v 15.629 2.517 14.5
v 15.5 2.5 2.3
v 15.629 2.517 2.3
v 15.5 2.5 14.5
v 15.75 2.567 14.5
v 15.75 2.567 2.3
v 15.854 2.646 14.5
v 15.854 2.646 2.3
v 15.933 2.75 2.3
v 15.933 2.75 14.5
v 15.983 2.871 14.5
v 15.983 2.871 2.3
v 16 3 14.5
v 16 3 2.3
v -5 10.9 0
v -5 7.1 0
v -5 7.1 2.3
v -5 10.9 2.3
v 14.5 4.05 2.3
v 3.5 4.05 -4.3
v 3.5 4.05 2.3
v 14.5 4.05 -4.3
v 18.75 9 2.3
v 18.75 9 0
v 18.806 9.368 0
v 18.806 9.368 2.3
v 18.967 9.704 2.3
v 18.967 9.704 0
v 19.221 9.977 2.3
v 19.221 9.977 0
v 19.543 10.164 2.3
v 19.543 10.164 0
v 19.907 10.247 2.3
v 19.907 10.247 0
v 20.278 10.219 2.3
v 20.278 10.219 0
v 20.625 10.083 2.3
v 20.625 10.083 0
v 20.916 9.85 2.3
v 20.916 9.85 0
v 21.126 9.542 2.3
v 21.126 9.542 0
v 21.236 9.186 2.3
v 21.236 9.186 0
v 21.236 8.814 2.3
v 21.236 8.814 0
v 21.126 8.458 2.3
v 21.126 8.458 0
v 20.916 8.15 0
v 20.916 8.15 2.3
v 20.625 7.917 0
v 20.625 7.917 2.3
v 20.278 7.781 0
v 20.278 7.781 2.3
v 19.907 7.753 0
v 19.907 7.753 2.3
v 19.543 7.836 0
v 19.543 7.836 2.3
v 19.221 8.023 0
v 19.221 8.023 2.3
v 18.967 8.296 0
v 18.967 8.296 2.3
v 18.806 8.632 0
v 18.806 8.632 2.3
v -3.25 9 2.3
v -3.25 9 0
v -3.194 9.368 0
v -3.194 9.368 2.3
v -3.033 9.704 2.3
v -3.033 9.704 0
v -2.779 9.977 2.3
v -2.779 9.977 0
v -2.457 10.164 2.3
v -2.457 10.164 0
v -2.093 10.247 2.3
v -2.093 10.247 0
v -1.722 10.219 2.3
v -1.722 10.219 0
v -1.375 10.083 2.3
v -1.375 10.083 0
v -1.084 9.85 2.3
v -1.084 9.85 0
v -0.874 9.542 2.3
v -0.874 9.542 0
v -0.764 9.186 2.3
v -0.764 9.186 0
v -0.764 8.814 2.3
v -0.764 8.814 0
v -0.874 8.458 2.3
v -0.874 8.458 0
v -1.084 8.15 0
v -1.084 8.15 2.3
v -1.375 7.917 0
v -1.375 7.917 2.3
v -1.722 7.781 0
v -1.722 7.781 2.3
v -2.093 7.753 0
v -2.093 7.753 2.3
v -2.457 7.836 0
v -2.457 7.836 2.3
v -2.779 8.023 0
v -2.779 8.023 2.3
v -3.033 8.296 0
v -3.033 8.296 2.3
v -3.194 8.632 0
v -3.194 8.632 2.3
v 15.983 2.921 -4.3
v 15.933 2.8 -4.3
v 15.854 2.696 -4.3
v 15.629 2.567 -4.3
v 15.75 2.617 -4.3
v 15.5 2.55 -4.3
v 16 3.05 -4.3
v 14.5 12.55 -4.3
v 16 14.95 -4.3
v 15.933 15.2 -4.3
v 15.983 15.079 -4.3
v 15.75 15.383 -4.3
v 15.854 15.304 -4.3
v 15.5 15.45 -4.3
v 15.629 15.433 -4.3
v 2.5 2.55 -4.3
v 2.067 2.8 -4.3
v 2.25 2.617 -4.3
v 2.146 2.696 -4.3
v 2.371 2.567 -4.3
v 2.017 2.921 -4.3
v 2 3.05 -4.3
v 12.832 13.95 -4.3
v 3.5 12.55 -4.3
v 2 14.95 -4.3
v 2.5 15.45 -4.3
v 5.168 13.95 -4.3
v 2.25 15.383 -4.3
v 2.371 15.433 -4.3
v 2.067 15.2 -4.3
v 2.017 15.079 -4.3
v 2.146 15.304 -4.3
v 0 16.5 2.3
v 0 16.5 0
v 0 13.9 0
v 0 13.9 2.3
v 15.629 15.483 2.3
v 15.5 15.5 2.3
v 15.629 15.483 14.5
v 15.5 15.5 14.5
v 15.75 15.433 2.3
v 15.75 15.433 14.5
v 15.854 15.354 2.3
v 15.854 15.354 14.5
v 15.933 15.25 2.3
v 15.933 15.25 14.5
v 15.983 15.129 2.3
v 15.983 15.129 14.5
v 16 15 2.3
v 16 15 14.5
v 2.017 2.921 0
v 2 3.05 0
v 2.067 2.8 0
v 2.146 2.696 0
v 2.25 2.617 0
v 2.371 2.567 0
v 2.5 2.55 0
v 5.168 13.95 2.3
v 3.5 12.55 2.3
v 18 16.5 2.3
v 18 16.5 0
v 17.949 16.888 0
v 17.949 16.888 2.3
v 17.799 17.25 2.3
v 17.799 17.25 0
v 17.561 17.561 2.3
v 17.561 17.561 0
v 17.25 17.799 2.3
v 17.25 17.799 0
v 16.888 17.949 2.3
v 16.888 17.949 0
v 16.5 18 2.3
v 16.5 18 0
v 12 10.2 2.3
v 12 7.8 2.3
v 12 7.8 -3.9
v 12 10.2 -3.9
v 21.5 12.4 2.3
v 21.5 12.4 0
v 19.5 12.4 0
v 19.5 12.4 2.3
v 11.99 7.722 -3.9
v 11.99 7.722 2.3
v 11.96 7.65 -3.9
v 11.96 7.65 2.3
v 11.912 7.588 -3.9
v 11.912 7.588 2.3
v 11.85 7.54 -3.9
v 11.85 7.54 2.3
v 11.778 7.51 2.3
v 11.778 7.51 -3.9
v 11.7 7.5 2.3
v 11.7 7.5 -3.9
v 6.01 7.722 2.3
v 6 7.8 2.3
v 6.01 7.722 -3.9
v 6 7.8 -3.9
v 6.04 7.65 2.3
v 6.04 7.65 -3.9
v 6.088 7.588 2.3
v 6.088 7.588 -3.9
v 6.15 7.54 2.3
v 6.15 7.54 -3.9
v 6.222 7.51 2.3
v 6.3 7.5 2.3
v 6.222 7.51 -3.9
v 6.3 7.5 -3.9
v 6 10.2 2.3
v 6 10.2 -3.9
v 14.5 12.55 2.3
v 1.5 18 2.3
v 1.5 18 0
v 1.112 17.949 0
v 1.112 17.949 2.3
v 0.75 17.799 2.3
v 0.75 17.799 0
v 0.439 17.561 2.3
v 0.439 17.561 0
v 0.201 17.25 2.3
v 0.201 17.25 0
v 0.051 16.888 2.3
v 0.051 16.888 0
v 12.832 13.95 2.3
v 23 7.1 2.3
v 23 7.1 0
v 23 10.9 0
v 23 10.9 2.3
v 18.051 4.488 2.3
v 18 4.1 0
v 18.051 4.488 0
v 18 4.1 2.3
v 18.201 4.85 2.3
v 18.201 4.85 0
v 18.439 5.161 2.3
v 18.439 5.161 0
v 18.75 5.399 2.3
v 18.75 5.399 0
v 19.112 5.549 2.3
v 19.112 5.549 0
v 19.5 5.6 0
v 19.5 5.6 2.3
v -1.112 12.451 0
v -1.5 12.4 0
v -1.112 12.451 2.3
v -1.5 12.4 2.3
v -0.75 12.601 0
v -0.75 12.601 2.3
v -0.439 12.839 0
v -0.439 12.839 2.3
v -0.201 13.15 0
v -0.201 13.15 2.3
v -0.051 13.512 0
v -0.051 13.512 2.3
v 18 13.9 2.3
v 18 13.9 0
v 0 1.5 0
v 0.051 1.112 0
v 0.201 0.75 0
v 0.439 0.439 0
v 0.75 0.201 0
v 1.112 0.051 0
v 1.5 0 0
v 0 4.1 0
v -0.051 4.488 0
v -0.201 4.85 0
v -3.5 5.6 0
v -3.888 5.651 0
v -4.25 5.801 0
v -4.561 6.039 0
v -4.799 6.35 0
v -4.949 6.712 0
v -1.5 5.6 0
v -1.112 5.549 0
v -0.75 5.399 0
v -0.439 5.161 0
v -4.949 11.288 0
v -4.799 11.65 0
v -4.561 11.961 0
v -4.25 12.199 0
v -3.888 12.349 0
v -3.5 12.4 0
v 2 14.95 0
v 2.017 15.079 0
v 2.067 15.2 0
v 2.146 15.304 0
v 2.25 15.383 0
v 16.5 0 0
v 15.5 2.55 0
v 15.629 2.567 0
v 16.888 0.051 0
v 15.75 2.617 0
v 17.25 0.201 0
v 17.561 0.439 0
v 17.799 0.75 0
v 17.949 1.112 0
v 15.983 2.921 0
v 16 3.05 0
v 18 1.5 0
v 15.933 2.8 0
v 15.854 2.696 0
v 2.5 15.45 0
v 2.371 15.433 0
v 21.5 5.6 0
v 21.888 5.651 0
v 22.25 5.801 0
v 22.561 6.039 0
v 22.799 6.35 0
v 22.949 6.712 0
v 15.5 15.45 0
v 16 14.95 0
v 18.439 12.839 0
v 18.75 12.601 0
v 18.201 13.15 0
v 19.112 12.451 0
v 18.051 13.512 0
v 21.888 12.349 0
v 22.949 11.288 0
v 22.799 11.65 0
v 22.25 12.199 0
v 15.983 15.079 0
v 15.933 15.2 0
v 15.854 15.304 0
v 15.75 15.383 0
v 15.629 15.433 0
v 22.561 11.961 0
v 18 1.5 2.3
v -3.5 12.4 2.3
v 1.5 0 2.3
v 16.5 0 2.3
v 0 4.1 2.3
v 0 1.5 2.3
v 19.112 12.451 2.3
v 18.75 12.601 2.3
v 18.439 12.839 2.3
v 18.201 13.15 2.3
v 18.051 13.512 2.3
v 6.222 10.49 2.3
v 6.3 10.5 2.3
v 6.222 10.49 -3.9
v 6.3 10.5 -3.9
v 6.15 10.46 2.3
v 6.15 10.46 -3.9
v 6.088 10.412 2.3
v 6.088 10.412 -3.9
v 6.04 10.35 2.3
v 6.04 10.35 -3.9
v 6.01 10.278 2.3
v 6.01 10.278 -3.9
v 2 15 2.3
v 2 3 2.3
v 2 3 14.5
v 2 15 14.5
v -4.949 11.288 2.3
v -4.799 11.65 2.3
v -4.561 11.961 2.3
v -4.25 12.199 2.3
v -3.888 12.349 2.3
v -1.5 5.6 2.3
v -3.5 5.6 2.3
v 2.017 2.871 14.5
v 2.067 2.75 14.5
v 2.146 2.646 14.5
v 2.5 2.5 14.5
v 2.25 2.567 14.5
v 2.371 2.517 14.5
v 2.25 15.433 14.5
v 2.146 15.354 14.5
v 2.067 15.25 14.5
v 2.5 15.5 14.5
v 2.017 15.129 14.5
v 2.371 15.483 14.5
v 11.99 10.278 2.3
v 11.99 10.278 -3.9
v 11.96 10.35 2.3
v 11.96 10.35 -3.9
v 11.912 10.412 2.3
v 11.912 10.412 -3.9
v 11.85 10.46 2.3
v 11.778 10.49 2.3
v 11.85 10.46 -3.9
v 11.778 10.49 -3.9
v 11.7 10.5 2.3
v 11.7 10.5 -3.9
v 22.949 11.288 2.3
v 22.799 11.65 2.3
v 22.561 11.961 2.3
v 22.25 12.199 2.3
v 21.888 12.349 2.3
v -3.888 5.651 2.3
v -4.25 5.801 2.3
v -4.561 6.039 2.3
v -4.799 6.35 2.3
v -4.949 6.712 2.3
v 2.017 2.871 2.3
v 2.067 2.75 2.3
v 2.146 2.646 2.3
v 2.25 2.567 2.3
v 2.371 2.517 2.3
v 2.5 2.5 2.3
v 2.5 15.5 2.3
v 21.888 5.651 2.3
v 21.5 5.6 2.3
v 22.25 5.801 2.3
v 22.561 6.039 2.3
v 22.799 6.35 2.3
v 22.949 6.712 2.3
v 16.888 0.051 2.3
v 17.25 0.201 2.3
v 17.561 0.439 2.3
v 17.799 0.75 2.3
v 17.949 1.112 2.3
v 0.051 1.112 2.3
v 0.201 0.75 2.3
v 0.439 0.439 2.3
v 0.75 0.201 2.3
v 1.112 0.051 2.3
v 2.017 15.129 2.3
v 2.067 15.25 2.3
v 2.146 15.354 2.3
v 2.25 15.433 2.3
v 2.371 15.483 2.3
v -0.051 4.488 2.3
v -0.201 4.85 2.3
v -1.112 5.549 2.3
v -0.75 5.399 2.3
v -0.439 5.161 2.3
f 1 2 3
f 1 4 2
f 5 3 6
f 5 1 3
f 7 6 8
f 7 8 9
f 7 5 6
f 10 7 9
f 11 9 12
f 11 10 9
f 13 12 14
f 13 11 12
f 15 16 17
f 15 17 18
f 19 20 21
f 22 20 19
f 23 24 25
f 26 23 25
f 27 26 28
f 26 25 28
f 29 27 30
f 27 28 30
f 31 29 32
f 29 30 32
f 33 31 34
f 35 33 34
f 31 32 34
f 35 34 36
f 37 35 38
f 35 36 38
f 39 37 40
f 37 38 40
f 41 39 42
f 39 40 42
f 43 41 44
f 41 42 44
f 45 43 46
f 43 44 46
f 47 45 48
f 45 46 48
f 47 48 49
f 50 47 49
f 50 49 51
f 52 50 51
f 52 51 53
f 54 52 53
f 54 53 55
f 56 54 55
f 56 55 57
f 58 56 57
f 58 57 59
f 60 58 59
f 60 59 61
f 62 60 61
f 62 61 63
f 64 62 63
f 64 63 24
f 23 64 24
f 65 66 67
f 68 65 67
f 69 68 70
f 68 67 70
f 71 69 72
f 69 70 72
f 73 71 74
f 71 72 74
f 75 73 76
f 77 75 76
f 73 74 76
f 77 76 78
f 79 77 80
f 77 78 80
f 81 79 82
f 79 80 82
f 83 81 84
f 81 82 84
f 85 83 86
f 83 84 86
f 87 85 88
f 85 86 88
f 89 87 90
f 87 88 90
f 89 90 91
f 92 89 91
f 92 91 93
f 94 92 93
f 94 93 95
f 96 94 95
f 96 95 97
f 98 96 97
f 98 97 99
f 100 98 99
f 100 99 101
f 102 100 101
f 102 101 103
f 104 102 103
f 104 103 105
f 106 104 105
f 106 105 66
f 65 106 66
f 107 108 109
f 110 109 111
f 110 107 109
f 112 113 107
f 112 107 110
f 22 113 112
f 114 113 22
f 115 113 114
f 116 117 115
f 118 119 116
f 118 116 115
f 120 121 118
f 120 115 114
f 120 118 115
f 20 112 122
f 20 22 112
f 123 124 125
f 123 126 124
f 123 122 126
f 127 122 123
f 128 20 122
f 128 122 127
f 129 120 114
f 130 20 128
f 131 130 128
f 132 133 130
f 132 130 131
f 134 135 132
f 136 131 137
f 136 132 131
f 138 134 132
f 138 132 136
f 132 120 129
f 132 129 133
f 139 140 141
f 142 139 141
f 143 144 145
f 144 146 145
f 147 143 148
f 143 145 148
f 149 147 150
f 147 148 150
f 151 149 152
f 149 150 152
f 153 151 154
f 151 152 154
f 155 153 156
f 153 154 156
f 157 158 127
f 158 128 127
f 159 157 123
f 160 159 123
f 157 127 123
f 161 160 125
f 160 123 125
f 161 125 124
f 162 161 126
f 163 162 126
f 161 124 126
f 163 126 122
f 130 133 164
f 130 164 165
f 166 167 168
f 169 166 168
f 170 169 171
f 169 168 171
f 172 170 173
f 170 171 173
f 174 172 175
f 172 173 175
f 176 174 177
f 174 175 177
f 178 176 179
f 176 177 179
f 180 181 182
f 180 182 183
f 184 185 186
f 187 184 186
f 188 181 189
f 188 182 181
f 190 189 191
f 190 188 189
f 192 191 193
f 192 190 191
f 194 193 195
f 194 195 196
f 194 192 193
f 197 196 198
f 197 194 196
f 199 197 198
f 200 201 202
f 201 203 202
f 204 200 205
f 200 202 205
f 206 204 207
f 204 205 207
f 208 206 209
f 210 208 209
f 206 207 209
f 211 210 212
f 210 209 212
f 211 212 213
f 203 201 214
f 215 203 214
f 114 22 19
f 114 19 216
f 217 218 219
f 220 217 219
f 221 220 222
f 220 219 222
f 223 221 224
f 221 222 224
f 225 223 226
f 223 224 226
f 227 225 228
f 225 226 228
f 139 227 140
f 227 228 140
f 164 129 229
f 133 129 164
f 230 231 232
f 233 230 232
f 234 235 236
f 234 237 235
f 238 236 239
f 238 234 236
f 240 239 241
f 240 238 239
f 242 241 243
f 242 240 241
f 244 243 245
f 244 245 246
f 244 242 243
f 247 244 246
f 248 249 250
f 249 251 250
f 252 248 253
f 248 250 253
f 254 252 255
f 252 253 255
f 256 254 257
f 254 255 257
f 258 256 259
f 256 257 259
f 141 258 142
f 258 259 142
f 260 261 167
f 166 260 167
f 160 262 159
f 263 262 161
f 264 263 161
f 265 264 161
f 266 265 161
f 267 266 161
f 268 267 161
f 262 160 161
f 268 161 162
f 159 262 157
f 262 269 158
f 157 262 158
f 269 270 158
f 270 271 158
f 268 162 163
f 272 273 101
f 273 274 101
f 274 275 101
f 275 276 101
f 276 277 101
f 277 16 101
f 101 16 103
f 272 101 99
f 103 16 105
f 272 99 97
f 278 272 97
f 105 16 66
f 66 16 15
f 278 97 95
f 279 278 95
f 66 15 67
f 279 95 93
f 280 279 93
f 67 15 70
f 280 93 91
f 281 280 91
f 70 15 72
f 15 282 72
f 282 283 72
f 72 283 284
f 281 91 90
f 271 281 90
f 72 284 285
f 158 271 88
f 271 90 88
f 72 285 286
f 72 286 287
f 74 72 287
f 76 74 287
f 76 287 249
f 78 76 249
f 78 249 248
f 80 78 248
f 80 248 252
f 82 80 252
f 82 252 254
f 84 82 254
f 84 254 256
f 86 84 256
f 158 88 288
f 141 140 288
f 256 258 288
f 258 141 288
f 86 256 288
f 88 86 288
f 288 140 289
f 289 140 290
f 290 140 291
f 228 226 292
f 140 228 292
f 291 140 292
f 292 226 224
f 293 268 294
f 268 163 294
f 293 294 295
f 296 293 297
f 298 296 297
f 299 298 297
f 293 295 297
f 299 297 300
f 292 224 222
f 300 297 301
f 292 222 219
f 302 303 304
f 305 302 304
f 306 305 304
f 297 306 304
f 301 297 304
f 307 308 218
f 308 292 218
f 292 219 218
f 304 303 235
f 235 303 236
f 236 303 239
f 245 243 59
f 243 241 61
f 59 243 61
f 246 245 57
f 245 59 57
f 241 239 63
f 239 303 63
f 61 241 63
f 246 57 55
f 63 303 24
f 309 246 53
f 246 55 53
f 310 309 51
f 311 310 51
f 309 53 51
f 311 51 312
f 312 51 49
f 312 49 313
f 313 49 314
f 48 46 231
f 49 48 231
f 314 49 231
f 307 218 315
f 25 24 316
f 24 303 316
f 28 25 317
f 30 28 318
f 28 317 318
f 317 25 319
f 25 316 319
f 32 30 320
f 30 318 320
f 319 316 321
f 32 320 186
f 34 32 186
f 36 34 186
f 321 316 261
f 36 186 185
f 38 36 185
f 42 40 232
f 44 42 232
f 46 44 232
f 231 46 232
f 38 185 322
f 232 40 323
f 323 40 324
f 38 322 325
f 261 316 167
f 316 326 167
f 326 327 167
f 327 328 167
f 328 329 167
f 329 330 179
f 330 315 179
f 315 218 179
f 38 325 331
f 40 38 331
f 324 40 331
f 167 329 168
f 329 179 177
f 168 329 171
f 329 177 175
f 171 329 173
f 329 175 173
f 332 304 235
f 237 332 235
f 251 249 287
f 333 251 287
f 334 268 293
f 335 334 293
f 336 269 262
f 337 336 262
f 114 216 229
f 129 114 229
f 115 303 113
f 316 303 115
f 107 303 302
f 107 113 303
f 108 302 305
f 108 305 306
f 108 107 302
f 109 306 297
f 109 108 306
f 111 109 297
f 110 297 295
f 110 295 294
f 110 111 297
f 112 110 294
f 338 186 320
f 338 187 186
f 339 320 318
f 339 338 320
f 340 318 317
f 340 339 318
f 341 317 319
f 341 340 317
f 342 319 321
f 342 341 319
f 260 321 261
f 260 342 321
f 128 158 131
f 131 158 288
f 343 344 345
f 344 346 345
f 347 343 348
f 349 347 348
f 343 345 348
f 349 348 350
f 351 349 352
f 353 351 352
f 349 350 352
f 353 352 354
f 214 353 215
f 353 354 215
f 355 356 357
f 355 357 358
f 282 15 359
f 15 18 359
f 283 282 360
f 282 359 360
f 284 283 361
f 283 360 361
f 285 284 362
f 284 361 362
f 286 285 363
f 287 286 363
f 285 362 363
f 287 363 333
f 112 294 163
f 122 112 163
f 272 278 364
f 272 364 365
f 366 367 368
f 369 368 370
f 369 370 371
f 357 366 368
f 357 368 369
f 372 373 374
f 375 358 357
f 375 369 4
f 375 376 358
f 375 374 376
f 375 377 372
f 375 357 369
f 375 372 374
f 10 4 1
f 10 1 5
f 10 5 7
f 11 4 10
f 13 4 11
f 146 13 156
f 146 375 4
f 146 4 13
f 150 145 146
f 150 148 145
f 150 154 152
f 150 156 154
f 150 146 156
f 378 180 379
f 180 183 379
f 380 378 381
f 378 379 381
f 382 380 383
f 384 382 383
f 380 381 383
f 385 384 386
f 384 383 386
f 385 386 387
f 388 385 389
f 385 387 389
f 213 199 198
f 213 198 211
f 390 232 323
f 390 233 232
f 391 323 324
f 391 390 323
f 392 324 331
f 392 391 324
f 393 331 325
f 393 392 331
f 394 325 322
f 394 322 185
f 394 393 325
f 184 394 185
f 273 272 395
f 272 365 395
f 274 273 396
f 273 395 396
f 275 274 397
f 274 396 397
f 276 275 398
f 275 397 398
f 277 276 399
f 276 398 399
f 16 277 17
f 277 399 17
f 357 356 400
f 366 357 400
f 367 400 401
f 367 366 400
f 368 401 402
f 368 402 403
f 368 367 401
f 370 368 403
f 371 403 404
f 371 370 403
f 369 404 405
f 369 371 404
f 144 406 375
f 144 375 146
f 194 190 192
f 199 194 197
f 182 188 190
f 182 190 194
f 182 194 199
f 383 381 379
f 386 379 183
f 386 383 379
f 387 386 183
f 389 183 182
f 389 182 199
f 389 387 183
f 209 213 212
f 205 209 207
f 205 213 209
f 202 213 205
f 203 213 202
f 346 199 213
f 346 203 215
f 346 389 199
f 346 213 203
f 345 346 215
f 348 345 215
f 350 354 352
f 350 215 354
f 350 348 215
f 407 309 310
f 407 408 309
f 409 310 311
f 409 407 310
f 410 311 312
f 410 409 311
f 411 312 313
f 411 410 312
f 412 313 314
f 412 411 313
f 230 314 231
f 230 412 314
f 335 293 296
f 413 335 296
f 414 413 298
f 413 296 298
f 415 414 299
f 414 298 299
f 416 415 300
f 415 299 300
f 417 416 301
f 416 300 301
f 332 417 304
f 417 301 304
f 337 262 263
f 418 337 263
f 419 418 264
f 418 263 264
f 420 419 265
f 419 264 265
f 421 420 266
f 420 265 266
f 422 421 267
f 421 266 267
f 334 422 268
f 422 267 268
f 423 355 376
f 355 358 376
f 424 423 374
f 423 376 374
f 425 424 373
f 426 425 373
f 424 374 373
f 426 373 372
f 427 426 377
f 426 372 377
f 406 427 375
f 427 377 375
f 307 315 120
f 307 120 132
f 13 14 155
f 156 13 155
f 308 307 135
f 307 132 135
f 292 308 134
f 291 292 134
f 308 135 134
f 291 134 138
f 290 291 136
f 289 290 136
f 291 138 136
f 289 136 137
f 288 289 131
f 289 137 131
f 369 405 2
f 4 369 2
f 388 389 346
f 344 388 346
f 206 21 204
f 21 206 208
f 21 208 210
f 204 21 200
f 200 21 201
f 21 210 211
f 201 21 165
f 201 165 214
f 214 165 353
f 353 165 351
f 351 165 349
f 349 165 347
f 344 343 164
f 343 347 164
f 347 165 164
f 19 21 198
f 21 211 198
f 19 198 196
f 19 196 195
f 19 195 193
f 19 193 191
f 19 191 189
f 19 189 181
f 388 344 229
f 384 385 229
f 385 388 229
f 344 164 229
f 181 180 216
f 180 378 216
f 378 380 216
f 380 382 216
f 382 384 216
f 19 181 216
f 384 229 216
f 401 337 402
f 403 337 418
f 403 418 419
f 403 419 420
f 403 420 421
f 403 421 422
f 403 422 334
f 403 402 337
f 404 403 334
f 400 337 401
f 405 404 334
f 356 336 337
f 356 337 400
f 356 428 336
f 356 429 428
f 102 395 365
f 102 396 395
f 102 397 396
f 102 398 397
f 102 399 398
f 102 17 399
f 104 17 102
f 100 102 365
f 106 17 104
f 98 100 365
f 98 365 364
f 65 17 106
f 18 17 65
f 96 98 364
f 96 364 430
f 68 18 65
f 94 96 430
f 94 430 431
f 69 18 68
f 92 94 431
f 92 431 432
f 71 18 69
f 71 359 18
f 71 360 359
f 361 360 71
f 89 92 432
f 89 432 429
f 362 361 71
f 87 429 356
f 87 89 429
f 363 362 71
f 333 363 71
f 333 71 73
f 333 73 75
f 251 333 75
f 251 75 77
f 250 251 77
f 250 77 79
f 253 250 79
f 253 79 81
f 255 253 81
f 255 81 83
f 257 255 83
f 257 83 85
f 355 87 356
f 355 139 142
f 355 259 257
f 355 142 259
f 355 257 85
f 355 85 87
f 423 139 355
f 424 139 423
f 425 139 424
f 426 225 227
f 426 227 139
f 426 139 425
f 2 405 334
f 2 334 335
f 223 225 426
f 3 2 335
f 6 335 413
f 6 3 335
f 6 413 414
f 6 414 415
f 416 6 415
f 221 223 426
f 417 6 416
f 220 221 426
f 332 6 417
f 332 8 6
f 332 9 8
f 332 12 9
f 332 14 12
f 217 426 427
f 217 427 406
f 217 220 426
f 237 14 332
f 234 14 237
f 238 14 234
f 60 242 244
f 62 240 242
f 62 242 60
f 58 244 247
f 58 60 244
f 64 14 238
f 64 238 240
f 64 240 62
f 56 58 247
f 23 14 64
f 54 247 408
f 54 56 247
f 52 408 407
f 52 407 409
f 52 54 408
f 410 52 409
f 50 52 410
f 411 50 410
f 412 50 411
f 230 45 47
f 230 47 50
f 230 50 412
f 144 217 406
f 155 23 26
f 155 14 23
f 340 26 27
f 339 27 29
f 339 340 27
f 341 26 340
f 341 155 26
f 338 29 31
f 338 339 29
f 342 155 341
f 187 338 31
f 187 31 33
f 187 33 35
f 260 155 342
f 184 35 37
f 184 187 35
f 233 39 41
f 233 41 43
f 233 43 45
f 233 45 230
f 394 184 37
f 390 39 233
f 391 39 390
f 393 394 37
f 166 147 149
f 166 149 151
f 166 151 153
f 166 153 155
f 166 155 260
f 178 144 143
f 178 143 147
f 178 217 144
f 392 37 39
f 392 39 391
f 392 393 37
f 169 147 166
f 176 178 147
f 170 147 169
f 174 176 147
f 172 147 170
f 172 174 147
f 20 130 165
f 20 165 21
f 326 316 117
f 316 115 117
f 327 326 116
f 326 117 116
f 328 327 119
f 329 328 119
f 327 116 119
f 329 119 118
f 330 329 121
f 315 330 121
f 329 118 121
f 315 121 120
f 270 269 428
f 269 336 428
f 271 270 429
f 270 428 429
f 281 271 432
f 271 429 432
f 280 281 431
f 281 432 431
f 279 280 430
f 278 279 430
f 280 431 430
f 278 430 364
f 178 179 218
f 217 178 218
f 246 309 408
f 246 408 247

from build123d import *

# Parameters (mm, degrees)
EXTRUDE_1_DEPTH     = 2.3
SKETCH_2_W          = 14
SKETCH_2_H          = 12.9
EXTRUDE_2_DEPTH     = 4.3
CUT_EXTRUDE_1_DEPTH = 27.297528401
SKETCH_4_W          = 14
SKETCH_4_H          = 13
EXTRUDE_3_DEPTH     = 12.2
FILLET_1_R          = 0.5
SKETCH_5_W          = 6
SKETCH_5_H          = 3
EXTRUDE_4_DEPTH     = 6.2
SKETCH_6_W          = 5
SKETCH_6_H          = 6.8
EXTRUDE_5_DEPTH     = 2.3
SKETCH_7_R          = 1.25
CUT_EXTRUDE_2_DEPTH = 33.607514471
FILLET_2_R          = 1.5
FILLET_3_R          = 0.3


with BuildPart() as part:
    # Эскиз1 → Бобышка-Вытянуть1 (new body)
    with BuildSketch(Plane.XY):
        with BuildLine():
            Line((1.5, 0), (16.5, 0))
            ThreePointArc((16.5, 0), (17.560660172, 0.439339828), (18, 1.5))
            Line((18, 1.5), (18, 16.5))
            ThreePointArc((18, 16.5), (17.560660172, 17.560660172), (16.5, 18))
            Line((16.5, 18), (1.5, 18))
            ThreePointArc((1.5, 18), (0.439339828, 17.560660172), (0, 16.5))
            Line((0, 16.5), (0, 1.5))
            ThreePointArc((0, 1.5), (0.439339828, 0.439339828), (1.5, 0))
        make_face()
    extrude(amount=EXTRUDE_1_DEPTH)

    # Эскиз2 → Бобышка-Вытянуть2 (add)
    with BuildSketch(Plane(origin=(0, 0, 0), x_dir=(-1, 0, 0), z_dir=(0, 0, -1))):
        with Locations((-9, 9)):
            Rectangle(SKETCH_2_W, SKETCH_2_H)
    extrude(amount=EXTRUDE_2_DEPTH)

    # Эскиз3 → Вырез-Вытянуть1 (cut, through all)
    with BuildSketch(Plane(origin=(0, 0, -4.3), x_dir=(-1, 0, 0), z_dir=(0, 0, -1))):
        Polygon((-14.5, 12.55), (-12.83154497, 13.95), (-5.16845503, 13.95), (-3.5, 12.55), (-3.5, 4.05), (-14.5, 4.05), align=None)
    extrude(amount=-CUT_EXTRUDE_1_DEPTH, mode=Mode.SUBTRACT)

    # Эскиз4 → Бобышка-Вытянуть3 (add)
    with BuildSketch(Plane.XY.offset(2.3)):
        with Locations((9, 9)):
            Rectangle(SKETCH_4_W, SKETCH_4_H)
    extrude(amount=EXTRUDE_3_DEPTH)

    # Скругление1
    fillet_1_edges = [part.edges().sort_by_distance(p)[0] for p in [
        (16, 15.45, -2.15),
        (16, 2.55, -2.15),
        (2, 2.55, -2.15),
        (2, 15.45, -2.15),
        (2, 15.5, 8.4),
        (2, 2.5, 8.4),
        (16, 2.5, 8.4),
        (16, 15.5, 8.4),
    ]]
    fillet(fillet_1_edges, radius=FILLET_1_R)

    # Эскиз5 → Бобышка-Вытянуть4 (add)
    with BuildSketch(Plane(origin=(0, 0, 2.3), x_dir=(-1, 0, 0), z_dir=(0, 0, -1))):
        with Locations((-9, 9)):
            Rectangle(SKETCH_5_W, SKETCH_5_H)
    extrude(amount=EXTRUDE_4_DEPTH)

    # Эскиз6 → Бобышка-Вытянуть5 (add)
    with BuildSketch(Plane(origin=(0, 0, 0), x_dir=(-1, 0, 0), z_dir=(0, 0, -1))):
        with Locations((-20.5, 9)):
            Rectangle(SKETCH_6_W, SKETCH_6_H)
        with Locations((2.5, 9)):
            Rectangle(SKETCH_6_W, SKETCH_6_H)
    extrude(amount=-EXTRUDE_5_DEPTH)

    # Эскиз7 → Вырез-Вытянуть2 (cut, through all)
    with BuildSketch(Plane(origin=(0, 0, 0), x_dir=(-1, 0, 0), z_dir=(0, 0, -1))):
        with Locations((-20, 9)):
            Circle(SKETCH_7_R)
        with Locations((2, 9)):
            Circle(SKETCH_7_R)
    extrude(amount=-CUT_EXTRUDE_2_DEPTH, mode=Mode.SUBTRACT)

    # Скругление2
    fillet_2_edges = [part.edges().sort_by_distance(p)[0] for p in [
        (18, 12.4, 1.15),
        (18, 5.6, 1.15),
        (23, 5.6, 1.15),
        (23, 12.4, 1.15),
        (0, 5.6, 1.15),
        (0, 12.4, 1.15),
        (-5, 12.4, 1.15),
        (-5, 5.6, 1.15),
    ]]
    fillet(fillet_2_edges, radius=FILLET_2_R)

    # Скругление3
    fillet_3_edges = [part.edges().sort_by_distance(p)[0] for p in [
        (12, 10.5, -0.8),
        (12, 7.5, -0.8),
        (6, 7.5, -0.8),
        (6, 10.5, -0.8),
    ]]
    fillet(fillet_3_edges, radius=FILLET_3_R)


solid = part.part
